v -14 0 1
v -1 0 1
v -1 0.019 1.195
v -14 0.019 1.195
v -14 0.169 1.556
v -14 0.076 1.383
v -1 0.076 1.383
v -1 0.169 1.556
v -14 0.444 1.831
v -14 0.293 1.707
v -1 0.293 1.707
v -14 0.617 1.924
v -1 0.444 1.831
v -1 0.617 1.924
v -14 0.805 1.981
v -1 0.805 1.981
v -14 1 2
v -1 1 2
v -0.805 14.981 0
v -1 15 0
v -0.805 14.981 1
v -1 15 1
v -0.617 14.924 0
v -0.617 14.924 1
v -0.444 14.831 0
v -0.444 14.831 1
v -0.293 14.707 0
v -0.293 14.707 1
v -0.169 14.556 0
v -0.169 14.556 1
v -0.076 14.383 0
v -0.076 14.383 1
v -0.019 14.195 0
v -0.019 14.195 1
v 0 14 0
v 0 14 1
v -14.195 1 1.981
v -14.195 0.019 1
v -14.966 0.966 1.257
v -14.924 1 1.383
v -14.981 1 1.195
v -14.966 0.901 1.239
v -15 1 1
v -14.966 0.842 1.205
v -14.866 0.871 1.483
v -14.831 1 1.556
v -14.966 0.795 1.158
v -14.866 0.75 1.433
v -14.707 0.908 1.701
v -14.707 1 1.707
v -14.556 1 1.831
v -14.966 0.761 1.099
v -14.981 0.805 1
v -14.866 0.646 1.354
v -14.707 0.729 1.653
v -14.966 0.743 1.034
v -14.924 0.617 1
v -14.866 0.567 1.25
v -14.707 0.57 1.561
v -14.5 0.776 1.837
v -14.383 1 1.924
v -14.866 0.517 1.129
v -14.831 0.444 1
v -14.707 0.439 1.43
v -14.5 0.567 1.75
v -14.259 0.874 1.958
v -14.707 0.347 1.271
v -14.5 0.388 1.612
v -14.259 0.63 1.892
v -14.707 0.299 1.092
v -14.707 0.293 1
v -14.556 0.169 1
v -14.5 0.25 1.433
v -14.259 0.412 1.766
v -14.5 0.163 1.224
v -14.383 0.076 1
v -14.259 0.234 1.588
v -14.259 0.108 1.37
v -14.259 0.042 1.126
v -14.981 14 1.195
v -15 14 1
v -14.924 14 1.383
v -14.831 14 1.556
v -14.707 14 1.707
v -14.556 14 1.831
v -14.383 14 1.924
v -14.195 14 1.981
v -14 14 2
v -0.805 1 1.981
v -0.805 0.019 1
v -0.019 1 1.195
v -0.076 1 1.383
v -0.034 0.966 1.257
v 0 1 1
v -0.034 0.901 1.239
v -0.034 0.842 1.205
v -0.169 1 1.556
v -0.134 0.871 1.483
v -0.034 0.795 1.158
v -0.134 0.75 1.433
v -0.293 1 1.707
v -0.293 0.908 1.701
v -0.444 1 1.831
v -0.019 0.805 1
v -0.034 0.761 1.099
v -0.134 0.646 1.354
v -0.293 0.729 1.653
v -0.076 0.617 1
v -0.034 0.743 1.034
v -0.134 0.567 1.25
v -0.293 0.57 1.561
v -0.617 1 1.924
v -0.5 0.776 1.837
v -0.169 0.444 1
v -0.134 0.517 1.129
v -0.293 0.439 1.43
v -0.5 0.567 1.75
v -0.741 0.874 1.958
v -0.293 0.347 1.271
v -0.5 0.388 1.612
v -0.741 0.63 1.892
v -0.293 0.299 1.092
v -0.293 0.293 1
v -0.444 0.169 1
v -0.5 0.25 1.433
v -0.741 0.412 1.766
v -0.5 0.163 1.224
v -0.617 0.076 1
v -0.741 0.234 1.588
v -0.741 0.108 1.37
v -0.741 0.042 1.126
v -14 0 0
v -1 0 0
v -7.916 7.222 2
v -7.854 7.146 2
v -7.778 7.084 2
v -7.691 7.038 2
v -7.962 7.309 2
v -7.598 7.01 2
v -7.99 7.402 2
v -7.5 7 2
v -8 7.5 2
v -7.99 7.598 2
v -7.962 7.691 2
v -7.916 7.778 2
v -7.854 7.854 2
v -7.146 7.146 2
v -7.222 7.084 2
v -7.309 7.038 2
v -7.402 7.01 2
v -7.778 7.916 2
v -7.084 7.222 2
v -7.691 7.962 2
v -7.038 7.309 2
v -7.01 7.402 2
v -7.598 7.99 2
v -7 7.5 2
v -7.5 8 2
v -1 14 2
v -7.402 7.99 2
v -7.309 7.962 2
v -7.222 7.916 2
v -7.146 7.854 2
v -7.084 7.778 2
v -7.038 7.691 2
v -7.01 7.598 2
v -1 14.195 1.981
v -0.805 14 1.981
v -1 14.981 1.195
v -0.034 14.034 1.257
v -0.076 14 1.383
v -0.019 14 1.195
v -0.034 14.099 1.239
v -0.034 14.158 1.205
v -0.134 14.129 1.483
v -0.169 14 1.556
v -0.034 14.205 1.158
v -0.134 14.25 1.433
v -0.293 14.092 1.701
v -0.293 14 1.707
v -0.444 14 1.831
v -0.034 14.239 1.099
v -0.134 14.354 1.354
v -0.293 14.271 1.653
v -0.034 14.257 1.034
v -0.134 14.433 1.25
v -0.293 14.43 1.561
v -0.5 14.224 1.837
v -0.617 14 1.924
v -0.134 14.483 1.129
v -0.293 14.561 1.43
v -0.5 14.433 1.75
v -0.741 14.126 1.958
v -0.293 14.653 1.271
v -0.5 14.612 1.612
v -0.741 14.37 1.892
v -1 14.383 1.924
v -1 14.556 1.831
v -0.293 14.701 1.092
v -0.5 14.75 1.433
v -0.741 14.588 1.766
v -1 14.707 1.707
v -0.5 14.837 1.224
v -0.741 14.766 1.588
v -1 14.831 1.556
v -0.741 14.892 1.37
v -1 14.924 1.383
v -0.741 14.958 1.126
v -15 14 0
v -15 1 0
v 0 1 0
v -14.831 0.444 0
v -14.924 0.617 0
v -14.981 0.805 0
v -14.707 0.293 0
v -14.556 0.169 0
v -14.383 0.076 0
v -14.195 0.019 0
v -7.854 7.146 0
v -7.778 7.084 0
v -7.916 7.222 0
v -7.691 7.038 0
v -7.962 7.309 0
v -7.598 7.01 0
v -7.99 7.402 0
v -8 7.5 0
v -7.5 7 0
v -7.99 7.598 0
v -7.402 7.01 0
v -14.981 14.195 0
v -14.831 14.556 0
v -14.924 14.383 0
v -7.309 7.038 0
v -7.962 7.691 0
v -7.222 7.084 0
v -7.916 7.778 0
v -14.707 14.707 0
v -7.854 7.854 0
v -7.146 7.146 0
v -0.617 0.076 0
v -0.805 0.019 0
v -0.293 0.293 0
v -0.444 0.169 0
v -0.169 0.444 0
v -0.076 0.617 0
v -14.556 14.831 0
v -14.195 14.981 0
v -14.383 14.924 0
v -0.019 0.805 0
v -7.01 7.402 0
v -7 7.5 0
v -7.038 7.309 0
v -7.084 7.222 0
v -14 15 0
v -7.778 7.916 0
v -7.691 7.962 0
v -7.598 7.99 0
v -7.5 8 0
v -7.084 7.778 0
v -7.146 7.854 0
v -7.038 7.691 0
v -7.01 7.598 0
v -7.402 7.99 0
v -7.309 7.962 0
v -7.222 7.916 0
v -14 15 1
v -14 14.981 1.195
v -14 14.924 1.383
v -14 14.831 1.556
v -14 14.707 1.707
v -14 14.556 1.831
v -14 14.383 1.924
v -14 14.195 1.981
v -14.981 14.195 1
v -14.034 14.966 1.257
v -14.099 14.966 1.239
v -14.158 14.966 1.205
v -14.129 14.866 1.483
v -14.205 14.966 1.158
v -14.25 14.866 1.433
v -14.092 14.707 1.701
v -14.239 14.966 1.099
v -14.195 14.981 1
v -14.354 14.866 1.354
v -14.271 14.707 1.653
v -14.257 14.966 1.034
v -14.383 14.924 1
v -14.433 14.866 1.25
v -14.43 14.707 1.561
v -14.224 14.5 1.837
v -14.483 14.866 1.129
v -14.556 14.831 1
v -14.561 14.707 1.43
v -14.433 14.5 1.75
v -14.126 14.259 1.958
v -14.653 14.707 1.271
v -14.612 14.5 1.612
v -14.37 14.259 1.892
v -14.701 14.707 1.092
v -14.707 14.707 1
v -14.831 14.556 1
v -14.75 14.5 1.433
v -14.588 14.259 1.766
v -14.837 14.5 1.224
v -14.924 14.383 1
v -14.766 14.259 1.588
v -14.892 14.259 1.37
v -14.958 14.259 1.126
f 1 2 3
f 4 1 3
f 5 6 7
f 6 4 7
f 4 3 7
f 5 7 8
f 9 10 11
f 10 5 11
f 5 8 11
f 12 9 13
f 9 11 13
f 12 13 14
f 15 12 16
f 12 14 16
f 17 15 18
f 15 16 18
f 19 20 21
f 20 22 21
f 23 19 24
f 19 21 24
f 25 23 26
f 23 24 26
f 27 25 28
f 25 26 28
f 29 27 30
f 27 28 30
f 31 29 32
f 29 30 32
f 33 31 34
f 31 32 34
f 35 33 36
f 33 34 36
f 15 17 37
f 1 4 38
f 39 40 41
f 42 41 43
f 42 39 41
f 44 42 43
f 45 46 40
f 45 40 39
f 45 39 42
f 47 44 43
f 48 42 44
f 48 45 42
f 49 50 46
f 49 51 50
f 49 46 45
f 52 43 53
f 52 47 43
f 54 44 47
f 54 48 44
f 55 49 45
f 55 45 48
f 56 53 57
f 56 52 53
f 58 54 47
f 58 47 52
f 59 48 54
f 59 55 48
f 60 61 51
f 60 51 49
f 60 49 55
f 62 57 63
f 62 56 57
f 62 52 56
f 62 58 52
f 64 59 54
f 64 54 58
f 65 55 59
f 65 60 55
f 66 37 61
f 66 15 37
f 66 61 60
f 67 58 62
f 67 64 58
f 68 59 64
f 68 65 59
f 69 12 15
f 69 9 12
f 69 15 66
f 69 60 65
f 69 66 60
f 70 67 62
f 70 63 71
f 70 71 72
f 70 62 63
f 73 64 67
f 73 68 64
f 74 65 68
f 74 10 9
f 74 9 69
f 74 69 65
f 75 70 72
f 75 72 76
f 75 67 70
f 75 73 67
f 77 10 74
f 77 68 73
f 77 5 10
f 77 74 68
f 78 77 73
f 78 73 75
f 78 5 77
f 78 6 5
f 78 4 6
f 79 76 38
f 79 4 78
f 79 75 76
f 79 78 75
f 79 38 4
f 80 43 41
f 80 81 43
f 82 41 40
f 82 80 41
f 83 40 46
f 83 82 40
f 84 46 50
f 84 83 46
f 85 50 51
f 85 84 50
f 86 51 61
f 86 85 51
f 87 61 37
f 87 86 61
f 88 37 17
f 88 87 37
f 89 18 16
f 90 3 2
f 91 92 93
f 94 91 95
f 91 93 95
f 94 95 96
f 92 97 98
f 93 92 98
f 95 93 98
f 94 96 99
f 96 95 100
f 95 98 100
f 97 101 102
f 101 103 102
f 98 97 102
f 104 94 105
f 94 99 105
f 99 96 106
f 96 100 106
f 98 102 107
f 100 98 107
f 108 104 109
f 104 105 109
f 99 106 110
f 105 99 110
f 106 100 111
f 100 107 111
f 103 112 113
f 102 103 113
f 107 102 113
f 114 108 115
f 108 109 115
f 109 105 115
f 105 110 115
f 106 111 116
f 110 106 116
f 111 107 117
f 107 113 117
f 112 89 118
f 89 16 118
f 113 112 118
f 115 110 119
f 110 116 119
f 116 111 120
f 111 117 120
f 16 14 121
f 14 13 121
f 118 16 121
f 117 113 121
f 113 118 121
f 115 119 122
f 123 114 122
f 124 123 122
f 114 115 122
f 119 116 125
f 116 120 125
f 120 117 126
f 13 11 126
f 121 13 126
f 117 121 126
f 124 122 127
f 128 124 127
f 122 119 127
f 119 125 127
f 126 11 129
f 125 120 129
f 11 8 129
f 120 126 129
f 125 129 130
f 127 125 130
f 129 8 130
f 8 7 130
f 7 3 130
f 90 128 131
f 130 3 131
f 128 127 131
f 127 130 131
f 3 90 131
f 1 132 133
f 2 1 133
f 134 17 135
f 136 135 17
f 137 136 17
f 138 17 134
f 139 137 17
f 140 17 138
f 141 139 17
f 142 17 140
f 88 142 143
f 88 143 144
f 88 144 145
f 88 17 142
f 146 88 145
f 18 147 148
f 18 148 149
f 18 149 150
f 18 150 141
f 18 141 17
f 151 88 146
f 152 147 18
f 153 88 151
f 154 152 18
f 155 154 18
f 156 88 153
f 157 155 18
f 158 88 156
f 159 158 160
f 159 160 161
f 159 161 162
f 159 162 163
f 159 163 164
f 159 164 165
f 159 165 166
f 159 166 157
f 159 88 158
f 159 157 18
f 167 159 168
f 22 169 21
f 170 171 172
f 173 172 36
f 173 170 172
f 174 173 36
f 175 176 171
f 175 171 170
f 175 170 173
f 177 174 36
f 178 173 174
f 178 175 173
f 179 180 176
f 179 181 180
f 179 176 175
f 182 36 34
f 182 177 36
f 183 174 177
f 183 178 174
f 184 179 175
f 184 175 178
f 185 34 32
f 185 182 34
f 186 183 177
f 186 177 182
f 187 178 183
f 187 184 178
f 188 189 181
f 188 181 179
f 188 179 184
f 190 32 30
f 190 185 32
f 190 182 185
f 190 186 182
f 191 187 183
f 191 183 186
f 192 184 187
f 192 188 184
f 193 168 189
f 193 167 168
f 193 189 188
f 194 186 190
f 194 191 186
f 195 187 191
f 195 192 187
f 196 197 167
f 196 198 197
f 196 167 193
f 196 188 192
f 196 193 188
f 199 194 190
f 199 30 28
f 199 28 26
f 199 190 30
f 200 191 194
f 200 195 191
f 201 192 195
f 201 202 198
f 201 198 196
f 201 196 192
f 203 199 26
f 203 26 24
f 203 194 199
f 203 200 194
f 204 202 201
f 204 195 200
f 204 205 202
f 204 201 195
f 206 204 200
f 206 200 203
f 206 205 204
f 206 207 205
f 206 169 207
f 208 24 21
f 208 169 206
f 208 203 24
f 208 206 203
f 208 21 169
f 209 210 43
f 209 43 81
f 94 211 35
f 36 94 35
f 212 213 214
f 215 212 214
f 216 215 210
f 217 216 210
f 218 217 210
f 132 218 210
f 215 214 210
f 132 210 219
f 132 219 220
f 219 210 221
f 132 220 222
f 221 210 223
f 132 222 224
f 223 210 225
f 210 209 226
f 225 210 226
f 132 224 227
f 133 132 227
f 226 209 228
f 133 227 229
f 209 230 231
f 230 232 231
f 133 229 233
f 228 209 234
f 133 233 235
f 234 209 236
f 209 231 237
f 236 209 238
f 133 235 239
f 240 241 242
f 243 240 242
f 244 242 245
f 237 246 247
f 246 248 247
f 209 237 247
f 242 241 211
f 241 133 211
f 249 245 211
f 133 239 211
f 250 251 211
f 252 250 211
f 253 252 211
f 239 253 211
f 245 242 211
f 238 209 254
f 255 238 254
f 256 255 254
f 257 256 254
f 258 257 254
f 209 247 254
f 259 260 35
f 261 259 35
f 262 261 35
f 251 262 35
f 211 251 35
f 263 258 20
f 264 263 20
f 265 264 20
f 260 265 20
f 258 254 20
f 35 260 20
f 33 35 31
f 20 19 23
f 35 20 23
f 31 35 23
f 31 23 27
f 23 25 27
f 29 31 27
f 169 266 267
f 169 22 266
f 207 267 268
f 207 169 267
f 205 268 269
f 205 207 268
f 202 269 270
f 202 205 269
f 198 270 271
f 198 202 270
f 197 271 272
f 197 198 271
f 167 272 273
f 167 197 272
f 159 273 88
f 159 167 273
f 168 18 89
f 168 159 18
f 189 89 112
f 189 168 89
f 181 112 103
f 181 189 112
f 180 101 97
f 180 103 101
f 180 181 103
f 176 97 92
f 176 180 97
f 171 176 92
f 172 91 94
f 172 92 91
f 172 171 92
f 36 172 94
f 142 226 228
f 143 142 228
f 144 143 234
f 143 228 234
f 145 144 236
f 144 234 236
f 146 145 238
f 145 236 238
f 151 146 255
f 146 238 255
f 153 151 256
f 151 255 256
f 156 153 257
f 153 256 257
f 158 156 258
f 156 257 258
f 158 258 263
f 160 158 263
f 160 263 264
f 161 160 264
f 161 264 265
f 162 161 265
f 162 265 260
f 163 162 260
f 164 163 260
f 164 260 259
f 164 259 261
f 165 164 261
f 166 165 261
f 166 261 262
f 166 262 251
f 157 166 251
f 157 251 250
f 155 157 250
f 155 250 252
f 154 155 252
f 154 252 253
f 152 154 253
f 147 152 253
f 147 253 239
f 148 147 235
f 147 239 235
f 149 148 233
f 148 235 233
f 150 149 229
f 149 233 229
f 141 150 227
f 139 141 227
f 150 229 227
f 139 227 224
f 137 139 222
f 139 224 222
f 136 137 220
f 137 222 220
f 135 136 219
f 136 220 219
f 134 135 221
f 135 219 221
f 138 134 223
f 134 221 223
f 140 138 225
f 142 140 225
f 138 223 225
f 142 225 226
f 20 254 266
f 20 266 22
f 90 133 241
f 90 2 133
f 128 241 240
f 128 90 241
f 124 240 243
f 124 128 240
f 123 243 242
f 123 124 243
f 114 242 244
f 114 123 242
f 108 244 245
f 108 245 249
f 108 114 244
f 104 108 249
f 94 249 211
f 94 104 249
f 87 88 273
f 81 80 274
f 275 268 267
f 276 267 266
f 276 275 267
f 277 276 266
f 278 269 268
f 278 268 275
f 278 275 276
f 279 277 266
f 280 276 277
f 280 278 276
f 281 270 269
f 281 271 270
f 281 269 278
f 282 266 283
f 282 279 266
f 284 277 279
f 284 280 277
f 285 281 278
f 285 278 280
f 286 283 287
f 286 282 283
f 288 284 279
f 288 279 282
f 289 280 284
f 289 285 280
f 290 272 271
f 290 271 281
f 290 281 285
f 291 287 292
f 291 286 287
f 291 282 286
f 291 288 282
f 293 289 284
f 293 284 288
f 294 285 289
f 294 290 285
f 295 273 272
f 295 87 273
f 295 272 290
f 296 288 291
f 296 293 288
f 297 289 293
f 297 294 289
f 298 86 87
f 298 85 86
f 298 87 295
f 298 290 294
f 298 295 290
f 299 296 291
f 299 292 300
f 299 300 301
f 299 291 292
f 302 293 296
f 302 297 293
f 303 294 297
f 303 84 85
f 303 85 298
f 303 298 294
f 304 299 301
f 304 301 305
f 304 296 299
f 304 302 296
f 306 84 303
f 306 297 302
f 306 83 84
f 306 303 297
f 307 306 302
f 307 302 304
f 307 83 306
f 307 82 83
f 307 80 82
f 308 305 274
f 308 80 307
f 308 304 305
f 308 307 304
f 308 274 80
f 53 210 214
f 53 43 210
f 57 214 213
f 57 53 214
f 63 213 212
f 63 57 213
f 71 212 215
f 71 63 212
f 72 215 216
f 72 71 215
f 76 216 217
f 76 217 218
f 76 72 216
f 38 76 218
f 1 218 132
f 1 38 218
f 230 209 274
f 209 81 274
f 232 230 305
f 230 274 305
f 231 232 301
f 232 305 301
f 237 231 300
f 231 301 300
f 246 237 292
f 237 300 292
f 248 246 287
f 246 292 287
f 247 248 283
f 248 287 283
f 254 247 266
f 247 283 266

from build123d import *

# Parameters (mm, degrees)
F0_W     = 15
F0_H     = 15
F1_DEPTH = 2
F3_D     = 1
F4_R     = 1


with BuildPart() as f1:
    # F0 (on Top) → F1 (new body)
    with BuildSketch(Plane.XY):
        with Locations((-7.5, 7.5)):
            Rectangle(F0_W, F0_H)
    extrude(amount=F1_DEPTH)

    # F3 (through all)
    with Locations(Plane.XY.offset(2)):
        with Locations((-7.5, 7.5)):
            Hole(F3_D / 2)

    # F4
    f4_edges = [f1.edges().sort_by_distance(p)[0] for p in [
        (-7.5, 0, 2),
        (-15, 7.5, 2),
        (-7.5, 15, 2),
        (0, 7.5, 2),
        (0, 0, 1),
        (-15, 0, 1),
        (0, 15, 1),
        (-15, 15, 1),
    ]]
    fillet(f4_edges, radius=F4_R)


solid = f1.part
